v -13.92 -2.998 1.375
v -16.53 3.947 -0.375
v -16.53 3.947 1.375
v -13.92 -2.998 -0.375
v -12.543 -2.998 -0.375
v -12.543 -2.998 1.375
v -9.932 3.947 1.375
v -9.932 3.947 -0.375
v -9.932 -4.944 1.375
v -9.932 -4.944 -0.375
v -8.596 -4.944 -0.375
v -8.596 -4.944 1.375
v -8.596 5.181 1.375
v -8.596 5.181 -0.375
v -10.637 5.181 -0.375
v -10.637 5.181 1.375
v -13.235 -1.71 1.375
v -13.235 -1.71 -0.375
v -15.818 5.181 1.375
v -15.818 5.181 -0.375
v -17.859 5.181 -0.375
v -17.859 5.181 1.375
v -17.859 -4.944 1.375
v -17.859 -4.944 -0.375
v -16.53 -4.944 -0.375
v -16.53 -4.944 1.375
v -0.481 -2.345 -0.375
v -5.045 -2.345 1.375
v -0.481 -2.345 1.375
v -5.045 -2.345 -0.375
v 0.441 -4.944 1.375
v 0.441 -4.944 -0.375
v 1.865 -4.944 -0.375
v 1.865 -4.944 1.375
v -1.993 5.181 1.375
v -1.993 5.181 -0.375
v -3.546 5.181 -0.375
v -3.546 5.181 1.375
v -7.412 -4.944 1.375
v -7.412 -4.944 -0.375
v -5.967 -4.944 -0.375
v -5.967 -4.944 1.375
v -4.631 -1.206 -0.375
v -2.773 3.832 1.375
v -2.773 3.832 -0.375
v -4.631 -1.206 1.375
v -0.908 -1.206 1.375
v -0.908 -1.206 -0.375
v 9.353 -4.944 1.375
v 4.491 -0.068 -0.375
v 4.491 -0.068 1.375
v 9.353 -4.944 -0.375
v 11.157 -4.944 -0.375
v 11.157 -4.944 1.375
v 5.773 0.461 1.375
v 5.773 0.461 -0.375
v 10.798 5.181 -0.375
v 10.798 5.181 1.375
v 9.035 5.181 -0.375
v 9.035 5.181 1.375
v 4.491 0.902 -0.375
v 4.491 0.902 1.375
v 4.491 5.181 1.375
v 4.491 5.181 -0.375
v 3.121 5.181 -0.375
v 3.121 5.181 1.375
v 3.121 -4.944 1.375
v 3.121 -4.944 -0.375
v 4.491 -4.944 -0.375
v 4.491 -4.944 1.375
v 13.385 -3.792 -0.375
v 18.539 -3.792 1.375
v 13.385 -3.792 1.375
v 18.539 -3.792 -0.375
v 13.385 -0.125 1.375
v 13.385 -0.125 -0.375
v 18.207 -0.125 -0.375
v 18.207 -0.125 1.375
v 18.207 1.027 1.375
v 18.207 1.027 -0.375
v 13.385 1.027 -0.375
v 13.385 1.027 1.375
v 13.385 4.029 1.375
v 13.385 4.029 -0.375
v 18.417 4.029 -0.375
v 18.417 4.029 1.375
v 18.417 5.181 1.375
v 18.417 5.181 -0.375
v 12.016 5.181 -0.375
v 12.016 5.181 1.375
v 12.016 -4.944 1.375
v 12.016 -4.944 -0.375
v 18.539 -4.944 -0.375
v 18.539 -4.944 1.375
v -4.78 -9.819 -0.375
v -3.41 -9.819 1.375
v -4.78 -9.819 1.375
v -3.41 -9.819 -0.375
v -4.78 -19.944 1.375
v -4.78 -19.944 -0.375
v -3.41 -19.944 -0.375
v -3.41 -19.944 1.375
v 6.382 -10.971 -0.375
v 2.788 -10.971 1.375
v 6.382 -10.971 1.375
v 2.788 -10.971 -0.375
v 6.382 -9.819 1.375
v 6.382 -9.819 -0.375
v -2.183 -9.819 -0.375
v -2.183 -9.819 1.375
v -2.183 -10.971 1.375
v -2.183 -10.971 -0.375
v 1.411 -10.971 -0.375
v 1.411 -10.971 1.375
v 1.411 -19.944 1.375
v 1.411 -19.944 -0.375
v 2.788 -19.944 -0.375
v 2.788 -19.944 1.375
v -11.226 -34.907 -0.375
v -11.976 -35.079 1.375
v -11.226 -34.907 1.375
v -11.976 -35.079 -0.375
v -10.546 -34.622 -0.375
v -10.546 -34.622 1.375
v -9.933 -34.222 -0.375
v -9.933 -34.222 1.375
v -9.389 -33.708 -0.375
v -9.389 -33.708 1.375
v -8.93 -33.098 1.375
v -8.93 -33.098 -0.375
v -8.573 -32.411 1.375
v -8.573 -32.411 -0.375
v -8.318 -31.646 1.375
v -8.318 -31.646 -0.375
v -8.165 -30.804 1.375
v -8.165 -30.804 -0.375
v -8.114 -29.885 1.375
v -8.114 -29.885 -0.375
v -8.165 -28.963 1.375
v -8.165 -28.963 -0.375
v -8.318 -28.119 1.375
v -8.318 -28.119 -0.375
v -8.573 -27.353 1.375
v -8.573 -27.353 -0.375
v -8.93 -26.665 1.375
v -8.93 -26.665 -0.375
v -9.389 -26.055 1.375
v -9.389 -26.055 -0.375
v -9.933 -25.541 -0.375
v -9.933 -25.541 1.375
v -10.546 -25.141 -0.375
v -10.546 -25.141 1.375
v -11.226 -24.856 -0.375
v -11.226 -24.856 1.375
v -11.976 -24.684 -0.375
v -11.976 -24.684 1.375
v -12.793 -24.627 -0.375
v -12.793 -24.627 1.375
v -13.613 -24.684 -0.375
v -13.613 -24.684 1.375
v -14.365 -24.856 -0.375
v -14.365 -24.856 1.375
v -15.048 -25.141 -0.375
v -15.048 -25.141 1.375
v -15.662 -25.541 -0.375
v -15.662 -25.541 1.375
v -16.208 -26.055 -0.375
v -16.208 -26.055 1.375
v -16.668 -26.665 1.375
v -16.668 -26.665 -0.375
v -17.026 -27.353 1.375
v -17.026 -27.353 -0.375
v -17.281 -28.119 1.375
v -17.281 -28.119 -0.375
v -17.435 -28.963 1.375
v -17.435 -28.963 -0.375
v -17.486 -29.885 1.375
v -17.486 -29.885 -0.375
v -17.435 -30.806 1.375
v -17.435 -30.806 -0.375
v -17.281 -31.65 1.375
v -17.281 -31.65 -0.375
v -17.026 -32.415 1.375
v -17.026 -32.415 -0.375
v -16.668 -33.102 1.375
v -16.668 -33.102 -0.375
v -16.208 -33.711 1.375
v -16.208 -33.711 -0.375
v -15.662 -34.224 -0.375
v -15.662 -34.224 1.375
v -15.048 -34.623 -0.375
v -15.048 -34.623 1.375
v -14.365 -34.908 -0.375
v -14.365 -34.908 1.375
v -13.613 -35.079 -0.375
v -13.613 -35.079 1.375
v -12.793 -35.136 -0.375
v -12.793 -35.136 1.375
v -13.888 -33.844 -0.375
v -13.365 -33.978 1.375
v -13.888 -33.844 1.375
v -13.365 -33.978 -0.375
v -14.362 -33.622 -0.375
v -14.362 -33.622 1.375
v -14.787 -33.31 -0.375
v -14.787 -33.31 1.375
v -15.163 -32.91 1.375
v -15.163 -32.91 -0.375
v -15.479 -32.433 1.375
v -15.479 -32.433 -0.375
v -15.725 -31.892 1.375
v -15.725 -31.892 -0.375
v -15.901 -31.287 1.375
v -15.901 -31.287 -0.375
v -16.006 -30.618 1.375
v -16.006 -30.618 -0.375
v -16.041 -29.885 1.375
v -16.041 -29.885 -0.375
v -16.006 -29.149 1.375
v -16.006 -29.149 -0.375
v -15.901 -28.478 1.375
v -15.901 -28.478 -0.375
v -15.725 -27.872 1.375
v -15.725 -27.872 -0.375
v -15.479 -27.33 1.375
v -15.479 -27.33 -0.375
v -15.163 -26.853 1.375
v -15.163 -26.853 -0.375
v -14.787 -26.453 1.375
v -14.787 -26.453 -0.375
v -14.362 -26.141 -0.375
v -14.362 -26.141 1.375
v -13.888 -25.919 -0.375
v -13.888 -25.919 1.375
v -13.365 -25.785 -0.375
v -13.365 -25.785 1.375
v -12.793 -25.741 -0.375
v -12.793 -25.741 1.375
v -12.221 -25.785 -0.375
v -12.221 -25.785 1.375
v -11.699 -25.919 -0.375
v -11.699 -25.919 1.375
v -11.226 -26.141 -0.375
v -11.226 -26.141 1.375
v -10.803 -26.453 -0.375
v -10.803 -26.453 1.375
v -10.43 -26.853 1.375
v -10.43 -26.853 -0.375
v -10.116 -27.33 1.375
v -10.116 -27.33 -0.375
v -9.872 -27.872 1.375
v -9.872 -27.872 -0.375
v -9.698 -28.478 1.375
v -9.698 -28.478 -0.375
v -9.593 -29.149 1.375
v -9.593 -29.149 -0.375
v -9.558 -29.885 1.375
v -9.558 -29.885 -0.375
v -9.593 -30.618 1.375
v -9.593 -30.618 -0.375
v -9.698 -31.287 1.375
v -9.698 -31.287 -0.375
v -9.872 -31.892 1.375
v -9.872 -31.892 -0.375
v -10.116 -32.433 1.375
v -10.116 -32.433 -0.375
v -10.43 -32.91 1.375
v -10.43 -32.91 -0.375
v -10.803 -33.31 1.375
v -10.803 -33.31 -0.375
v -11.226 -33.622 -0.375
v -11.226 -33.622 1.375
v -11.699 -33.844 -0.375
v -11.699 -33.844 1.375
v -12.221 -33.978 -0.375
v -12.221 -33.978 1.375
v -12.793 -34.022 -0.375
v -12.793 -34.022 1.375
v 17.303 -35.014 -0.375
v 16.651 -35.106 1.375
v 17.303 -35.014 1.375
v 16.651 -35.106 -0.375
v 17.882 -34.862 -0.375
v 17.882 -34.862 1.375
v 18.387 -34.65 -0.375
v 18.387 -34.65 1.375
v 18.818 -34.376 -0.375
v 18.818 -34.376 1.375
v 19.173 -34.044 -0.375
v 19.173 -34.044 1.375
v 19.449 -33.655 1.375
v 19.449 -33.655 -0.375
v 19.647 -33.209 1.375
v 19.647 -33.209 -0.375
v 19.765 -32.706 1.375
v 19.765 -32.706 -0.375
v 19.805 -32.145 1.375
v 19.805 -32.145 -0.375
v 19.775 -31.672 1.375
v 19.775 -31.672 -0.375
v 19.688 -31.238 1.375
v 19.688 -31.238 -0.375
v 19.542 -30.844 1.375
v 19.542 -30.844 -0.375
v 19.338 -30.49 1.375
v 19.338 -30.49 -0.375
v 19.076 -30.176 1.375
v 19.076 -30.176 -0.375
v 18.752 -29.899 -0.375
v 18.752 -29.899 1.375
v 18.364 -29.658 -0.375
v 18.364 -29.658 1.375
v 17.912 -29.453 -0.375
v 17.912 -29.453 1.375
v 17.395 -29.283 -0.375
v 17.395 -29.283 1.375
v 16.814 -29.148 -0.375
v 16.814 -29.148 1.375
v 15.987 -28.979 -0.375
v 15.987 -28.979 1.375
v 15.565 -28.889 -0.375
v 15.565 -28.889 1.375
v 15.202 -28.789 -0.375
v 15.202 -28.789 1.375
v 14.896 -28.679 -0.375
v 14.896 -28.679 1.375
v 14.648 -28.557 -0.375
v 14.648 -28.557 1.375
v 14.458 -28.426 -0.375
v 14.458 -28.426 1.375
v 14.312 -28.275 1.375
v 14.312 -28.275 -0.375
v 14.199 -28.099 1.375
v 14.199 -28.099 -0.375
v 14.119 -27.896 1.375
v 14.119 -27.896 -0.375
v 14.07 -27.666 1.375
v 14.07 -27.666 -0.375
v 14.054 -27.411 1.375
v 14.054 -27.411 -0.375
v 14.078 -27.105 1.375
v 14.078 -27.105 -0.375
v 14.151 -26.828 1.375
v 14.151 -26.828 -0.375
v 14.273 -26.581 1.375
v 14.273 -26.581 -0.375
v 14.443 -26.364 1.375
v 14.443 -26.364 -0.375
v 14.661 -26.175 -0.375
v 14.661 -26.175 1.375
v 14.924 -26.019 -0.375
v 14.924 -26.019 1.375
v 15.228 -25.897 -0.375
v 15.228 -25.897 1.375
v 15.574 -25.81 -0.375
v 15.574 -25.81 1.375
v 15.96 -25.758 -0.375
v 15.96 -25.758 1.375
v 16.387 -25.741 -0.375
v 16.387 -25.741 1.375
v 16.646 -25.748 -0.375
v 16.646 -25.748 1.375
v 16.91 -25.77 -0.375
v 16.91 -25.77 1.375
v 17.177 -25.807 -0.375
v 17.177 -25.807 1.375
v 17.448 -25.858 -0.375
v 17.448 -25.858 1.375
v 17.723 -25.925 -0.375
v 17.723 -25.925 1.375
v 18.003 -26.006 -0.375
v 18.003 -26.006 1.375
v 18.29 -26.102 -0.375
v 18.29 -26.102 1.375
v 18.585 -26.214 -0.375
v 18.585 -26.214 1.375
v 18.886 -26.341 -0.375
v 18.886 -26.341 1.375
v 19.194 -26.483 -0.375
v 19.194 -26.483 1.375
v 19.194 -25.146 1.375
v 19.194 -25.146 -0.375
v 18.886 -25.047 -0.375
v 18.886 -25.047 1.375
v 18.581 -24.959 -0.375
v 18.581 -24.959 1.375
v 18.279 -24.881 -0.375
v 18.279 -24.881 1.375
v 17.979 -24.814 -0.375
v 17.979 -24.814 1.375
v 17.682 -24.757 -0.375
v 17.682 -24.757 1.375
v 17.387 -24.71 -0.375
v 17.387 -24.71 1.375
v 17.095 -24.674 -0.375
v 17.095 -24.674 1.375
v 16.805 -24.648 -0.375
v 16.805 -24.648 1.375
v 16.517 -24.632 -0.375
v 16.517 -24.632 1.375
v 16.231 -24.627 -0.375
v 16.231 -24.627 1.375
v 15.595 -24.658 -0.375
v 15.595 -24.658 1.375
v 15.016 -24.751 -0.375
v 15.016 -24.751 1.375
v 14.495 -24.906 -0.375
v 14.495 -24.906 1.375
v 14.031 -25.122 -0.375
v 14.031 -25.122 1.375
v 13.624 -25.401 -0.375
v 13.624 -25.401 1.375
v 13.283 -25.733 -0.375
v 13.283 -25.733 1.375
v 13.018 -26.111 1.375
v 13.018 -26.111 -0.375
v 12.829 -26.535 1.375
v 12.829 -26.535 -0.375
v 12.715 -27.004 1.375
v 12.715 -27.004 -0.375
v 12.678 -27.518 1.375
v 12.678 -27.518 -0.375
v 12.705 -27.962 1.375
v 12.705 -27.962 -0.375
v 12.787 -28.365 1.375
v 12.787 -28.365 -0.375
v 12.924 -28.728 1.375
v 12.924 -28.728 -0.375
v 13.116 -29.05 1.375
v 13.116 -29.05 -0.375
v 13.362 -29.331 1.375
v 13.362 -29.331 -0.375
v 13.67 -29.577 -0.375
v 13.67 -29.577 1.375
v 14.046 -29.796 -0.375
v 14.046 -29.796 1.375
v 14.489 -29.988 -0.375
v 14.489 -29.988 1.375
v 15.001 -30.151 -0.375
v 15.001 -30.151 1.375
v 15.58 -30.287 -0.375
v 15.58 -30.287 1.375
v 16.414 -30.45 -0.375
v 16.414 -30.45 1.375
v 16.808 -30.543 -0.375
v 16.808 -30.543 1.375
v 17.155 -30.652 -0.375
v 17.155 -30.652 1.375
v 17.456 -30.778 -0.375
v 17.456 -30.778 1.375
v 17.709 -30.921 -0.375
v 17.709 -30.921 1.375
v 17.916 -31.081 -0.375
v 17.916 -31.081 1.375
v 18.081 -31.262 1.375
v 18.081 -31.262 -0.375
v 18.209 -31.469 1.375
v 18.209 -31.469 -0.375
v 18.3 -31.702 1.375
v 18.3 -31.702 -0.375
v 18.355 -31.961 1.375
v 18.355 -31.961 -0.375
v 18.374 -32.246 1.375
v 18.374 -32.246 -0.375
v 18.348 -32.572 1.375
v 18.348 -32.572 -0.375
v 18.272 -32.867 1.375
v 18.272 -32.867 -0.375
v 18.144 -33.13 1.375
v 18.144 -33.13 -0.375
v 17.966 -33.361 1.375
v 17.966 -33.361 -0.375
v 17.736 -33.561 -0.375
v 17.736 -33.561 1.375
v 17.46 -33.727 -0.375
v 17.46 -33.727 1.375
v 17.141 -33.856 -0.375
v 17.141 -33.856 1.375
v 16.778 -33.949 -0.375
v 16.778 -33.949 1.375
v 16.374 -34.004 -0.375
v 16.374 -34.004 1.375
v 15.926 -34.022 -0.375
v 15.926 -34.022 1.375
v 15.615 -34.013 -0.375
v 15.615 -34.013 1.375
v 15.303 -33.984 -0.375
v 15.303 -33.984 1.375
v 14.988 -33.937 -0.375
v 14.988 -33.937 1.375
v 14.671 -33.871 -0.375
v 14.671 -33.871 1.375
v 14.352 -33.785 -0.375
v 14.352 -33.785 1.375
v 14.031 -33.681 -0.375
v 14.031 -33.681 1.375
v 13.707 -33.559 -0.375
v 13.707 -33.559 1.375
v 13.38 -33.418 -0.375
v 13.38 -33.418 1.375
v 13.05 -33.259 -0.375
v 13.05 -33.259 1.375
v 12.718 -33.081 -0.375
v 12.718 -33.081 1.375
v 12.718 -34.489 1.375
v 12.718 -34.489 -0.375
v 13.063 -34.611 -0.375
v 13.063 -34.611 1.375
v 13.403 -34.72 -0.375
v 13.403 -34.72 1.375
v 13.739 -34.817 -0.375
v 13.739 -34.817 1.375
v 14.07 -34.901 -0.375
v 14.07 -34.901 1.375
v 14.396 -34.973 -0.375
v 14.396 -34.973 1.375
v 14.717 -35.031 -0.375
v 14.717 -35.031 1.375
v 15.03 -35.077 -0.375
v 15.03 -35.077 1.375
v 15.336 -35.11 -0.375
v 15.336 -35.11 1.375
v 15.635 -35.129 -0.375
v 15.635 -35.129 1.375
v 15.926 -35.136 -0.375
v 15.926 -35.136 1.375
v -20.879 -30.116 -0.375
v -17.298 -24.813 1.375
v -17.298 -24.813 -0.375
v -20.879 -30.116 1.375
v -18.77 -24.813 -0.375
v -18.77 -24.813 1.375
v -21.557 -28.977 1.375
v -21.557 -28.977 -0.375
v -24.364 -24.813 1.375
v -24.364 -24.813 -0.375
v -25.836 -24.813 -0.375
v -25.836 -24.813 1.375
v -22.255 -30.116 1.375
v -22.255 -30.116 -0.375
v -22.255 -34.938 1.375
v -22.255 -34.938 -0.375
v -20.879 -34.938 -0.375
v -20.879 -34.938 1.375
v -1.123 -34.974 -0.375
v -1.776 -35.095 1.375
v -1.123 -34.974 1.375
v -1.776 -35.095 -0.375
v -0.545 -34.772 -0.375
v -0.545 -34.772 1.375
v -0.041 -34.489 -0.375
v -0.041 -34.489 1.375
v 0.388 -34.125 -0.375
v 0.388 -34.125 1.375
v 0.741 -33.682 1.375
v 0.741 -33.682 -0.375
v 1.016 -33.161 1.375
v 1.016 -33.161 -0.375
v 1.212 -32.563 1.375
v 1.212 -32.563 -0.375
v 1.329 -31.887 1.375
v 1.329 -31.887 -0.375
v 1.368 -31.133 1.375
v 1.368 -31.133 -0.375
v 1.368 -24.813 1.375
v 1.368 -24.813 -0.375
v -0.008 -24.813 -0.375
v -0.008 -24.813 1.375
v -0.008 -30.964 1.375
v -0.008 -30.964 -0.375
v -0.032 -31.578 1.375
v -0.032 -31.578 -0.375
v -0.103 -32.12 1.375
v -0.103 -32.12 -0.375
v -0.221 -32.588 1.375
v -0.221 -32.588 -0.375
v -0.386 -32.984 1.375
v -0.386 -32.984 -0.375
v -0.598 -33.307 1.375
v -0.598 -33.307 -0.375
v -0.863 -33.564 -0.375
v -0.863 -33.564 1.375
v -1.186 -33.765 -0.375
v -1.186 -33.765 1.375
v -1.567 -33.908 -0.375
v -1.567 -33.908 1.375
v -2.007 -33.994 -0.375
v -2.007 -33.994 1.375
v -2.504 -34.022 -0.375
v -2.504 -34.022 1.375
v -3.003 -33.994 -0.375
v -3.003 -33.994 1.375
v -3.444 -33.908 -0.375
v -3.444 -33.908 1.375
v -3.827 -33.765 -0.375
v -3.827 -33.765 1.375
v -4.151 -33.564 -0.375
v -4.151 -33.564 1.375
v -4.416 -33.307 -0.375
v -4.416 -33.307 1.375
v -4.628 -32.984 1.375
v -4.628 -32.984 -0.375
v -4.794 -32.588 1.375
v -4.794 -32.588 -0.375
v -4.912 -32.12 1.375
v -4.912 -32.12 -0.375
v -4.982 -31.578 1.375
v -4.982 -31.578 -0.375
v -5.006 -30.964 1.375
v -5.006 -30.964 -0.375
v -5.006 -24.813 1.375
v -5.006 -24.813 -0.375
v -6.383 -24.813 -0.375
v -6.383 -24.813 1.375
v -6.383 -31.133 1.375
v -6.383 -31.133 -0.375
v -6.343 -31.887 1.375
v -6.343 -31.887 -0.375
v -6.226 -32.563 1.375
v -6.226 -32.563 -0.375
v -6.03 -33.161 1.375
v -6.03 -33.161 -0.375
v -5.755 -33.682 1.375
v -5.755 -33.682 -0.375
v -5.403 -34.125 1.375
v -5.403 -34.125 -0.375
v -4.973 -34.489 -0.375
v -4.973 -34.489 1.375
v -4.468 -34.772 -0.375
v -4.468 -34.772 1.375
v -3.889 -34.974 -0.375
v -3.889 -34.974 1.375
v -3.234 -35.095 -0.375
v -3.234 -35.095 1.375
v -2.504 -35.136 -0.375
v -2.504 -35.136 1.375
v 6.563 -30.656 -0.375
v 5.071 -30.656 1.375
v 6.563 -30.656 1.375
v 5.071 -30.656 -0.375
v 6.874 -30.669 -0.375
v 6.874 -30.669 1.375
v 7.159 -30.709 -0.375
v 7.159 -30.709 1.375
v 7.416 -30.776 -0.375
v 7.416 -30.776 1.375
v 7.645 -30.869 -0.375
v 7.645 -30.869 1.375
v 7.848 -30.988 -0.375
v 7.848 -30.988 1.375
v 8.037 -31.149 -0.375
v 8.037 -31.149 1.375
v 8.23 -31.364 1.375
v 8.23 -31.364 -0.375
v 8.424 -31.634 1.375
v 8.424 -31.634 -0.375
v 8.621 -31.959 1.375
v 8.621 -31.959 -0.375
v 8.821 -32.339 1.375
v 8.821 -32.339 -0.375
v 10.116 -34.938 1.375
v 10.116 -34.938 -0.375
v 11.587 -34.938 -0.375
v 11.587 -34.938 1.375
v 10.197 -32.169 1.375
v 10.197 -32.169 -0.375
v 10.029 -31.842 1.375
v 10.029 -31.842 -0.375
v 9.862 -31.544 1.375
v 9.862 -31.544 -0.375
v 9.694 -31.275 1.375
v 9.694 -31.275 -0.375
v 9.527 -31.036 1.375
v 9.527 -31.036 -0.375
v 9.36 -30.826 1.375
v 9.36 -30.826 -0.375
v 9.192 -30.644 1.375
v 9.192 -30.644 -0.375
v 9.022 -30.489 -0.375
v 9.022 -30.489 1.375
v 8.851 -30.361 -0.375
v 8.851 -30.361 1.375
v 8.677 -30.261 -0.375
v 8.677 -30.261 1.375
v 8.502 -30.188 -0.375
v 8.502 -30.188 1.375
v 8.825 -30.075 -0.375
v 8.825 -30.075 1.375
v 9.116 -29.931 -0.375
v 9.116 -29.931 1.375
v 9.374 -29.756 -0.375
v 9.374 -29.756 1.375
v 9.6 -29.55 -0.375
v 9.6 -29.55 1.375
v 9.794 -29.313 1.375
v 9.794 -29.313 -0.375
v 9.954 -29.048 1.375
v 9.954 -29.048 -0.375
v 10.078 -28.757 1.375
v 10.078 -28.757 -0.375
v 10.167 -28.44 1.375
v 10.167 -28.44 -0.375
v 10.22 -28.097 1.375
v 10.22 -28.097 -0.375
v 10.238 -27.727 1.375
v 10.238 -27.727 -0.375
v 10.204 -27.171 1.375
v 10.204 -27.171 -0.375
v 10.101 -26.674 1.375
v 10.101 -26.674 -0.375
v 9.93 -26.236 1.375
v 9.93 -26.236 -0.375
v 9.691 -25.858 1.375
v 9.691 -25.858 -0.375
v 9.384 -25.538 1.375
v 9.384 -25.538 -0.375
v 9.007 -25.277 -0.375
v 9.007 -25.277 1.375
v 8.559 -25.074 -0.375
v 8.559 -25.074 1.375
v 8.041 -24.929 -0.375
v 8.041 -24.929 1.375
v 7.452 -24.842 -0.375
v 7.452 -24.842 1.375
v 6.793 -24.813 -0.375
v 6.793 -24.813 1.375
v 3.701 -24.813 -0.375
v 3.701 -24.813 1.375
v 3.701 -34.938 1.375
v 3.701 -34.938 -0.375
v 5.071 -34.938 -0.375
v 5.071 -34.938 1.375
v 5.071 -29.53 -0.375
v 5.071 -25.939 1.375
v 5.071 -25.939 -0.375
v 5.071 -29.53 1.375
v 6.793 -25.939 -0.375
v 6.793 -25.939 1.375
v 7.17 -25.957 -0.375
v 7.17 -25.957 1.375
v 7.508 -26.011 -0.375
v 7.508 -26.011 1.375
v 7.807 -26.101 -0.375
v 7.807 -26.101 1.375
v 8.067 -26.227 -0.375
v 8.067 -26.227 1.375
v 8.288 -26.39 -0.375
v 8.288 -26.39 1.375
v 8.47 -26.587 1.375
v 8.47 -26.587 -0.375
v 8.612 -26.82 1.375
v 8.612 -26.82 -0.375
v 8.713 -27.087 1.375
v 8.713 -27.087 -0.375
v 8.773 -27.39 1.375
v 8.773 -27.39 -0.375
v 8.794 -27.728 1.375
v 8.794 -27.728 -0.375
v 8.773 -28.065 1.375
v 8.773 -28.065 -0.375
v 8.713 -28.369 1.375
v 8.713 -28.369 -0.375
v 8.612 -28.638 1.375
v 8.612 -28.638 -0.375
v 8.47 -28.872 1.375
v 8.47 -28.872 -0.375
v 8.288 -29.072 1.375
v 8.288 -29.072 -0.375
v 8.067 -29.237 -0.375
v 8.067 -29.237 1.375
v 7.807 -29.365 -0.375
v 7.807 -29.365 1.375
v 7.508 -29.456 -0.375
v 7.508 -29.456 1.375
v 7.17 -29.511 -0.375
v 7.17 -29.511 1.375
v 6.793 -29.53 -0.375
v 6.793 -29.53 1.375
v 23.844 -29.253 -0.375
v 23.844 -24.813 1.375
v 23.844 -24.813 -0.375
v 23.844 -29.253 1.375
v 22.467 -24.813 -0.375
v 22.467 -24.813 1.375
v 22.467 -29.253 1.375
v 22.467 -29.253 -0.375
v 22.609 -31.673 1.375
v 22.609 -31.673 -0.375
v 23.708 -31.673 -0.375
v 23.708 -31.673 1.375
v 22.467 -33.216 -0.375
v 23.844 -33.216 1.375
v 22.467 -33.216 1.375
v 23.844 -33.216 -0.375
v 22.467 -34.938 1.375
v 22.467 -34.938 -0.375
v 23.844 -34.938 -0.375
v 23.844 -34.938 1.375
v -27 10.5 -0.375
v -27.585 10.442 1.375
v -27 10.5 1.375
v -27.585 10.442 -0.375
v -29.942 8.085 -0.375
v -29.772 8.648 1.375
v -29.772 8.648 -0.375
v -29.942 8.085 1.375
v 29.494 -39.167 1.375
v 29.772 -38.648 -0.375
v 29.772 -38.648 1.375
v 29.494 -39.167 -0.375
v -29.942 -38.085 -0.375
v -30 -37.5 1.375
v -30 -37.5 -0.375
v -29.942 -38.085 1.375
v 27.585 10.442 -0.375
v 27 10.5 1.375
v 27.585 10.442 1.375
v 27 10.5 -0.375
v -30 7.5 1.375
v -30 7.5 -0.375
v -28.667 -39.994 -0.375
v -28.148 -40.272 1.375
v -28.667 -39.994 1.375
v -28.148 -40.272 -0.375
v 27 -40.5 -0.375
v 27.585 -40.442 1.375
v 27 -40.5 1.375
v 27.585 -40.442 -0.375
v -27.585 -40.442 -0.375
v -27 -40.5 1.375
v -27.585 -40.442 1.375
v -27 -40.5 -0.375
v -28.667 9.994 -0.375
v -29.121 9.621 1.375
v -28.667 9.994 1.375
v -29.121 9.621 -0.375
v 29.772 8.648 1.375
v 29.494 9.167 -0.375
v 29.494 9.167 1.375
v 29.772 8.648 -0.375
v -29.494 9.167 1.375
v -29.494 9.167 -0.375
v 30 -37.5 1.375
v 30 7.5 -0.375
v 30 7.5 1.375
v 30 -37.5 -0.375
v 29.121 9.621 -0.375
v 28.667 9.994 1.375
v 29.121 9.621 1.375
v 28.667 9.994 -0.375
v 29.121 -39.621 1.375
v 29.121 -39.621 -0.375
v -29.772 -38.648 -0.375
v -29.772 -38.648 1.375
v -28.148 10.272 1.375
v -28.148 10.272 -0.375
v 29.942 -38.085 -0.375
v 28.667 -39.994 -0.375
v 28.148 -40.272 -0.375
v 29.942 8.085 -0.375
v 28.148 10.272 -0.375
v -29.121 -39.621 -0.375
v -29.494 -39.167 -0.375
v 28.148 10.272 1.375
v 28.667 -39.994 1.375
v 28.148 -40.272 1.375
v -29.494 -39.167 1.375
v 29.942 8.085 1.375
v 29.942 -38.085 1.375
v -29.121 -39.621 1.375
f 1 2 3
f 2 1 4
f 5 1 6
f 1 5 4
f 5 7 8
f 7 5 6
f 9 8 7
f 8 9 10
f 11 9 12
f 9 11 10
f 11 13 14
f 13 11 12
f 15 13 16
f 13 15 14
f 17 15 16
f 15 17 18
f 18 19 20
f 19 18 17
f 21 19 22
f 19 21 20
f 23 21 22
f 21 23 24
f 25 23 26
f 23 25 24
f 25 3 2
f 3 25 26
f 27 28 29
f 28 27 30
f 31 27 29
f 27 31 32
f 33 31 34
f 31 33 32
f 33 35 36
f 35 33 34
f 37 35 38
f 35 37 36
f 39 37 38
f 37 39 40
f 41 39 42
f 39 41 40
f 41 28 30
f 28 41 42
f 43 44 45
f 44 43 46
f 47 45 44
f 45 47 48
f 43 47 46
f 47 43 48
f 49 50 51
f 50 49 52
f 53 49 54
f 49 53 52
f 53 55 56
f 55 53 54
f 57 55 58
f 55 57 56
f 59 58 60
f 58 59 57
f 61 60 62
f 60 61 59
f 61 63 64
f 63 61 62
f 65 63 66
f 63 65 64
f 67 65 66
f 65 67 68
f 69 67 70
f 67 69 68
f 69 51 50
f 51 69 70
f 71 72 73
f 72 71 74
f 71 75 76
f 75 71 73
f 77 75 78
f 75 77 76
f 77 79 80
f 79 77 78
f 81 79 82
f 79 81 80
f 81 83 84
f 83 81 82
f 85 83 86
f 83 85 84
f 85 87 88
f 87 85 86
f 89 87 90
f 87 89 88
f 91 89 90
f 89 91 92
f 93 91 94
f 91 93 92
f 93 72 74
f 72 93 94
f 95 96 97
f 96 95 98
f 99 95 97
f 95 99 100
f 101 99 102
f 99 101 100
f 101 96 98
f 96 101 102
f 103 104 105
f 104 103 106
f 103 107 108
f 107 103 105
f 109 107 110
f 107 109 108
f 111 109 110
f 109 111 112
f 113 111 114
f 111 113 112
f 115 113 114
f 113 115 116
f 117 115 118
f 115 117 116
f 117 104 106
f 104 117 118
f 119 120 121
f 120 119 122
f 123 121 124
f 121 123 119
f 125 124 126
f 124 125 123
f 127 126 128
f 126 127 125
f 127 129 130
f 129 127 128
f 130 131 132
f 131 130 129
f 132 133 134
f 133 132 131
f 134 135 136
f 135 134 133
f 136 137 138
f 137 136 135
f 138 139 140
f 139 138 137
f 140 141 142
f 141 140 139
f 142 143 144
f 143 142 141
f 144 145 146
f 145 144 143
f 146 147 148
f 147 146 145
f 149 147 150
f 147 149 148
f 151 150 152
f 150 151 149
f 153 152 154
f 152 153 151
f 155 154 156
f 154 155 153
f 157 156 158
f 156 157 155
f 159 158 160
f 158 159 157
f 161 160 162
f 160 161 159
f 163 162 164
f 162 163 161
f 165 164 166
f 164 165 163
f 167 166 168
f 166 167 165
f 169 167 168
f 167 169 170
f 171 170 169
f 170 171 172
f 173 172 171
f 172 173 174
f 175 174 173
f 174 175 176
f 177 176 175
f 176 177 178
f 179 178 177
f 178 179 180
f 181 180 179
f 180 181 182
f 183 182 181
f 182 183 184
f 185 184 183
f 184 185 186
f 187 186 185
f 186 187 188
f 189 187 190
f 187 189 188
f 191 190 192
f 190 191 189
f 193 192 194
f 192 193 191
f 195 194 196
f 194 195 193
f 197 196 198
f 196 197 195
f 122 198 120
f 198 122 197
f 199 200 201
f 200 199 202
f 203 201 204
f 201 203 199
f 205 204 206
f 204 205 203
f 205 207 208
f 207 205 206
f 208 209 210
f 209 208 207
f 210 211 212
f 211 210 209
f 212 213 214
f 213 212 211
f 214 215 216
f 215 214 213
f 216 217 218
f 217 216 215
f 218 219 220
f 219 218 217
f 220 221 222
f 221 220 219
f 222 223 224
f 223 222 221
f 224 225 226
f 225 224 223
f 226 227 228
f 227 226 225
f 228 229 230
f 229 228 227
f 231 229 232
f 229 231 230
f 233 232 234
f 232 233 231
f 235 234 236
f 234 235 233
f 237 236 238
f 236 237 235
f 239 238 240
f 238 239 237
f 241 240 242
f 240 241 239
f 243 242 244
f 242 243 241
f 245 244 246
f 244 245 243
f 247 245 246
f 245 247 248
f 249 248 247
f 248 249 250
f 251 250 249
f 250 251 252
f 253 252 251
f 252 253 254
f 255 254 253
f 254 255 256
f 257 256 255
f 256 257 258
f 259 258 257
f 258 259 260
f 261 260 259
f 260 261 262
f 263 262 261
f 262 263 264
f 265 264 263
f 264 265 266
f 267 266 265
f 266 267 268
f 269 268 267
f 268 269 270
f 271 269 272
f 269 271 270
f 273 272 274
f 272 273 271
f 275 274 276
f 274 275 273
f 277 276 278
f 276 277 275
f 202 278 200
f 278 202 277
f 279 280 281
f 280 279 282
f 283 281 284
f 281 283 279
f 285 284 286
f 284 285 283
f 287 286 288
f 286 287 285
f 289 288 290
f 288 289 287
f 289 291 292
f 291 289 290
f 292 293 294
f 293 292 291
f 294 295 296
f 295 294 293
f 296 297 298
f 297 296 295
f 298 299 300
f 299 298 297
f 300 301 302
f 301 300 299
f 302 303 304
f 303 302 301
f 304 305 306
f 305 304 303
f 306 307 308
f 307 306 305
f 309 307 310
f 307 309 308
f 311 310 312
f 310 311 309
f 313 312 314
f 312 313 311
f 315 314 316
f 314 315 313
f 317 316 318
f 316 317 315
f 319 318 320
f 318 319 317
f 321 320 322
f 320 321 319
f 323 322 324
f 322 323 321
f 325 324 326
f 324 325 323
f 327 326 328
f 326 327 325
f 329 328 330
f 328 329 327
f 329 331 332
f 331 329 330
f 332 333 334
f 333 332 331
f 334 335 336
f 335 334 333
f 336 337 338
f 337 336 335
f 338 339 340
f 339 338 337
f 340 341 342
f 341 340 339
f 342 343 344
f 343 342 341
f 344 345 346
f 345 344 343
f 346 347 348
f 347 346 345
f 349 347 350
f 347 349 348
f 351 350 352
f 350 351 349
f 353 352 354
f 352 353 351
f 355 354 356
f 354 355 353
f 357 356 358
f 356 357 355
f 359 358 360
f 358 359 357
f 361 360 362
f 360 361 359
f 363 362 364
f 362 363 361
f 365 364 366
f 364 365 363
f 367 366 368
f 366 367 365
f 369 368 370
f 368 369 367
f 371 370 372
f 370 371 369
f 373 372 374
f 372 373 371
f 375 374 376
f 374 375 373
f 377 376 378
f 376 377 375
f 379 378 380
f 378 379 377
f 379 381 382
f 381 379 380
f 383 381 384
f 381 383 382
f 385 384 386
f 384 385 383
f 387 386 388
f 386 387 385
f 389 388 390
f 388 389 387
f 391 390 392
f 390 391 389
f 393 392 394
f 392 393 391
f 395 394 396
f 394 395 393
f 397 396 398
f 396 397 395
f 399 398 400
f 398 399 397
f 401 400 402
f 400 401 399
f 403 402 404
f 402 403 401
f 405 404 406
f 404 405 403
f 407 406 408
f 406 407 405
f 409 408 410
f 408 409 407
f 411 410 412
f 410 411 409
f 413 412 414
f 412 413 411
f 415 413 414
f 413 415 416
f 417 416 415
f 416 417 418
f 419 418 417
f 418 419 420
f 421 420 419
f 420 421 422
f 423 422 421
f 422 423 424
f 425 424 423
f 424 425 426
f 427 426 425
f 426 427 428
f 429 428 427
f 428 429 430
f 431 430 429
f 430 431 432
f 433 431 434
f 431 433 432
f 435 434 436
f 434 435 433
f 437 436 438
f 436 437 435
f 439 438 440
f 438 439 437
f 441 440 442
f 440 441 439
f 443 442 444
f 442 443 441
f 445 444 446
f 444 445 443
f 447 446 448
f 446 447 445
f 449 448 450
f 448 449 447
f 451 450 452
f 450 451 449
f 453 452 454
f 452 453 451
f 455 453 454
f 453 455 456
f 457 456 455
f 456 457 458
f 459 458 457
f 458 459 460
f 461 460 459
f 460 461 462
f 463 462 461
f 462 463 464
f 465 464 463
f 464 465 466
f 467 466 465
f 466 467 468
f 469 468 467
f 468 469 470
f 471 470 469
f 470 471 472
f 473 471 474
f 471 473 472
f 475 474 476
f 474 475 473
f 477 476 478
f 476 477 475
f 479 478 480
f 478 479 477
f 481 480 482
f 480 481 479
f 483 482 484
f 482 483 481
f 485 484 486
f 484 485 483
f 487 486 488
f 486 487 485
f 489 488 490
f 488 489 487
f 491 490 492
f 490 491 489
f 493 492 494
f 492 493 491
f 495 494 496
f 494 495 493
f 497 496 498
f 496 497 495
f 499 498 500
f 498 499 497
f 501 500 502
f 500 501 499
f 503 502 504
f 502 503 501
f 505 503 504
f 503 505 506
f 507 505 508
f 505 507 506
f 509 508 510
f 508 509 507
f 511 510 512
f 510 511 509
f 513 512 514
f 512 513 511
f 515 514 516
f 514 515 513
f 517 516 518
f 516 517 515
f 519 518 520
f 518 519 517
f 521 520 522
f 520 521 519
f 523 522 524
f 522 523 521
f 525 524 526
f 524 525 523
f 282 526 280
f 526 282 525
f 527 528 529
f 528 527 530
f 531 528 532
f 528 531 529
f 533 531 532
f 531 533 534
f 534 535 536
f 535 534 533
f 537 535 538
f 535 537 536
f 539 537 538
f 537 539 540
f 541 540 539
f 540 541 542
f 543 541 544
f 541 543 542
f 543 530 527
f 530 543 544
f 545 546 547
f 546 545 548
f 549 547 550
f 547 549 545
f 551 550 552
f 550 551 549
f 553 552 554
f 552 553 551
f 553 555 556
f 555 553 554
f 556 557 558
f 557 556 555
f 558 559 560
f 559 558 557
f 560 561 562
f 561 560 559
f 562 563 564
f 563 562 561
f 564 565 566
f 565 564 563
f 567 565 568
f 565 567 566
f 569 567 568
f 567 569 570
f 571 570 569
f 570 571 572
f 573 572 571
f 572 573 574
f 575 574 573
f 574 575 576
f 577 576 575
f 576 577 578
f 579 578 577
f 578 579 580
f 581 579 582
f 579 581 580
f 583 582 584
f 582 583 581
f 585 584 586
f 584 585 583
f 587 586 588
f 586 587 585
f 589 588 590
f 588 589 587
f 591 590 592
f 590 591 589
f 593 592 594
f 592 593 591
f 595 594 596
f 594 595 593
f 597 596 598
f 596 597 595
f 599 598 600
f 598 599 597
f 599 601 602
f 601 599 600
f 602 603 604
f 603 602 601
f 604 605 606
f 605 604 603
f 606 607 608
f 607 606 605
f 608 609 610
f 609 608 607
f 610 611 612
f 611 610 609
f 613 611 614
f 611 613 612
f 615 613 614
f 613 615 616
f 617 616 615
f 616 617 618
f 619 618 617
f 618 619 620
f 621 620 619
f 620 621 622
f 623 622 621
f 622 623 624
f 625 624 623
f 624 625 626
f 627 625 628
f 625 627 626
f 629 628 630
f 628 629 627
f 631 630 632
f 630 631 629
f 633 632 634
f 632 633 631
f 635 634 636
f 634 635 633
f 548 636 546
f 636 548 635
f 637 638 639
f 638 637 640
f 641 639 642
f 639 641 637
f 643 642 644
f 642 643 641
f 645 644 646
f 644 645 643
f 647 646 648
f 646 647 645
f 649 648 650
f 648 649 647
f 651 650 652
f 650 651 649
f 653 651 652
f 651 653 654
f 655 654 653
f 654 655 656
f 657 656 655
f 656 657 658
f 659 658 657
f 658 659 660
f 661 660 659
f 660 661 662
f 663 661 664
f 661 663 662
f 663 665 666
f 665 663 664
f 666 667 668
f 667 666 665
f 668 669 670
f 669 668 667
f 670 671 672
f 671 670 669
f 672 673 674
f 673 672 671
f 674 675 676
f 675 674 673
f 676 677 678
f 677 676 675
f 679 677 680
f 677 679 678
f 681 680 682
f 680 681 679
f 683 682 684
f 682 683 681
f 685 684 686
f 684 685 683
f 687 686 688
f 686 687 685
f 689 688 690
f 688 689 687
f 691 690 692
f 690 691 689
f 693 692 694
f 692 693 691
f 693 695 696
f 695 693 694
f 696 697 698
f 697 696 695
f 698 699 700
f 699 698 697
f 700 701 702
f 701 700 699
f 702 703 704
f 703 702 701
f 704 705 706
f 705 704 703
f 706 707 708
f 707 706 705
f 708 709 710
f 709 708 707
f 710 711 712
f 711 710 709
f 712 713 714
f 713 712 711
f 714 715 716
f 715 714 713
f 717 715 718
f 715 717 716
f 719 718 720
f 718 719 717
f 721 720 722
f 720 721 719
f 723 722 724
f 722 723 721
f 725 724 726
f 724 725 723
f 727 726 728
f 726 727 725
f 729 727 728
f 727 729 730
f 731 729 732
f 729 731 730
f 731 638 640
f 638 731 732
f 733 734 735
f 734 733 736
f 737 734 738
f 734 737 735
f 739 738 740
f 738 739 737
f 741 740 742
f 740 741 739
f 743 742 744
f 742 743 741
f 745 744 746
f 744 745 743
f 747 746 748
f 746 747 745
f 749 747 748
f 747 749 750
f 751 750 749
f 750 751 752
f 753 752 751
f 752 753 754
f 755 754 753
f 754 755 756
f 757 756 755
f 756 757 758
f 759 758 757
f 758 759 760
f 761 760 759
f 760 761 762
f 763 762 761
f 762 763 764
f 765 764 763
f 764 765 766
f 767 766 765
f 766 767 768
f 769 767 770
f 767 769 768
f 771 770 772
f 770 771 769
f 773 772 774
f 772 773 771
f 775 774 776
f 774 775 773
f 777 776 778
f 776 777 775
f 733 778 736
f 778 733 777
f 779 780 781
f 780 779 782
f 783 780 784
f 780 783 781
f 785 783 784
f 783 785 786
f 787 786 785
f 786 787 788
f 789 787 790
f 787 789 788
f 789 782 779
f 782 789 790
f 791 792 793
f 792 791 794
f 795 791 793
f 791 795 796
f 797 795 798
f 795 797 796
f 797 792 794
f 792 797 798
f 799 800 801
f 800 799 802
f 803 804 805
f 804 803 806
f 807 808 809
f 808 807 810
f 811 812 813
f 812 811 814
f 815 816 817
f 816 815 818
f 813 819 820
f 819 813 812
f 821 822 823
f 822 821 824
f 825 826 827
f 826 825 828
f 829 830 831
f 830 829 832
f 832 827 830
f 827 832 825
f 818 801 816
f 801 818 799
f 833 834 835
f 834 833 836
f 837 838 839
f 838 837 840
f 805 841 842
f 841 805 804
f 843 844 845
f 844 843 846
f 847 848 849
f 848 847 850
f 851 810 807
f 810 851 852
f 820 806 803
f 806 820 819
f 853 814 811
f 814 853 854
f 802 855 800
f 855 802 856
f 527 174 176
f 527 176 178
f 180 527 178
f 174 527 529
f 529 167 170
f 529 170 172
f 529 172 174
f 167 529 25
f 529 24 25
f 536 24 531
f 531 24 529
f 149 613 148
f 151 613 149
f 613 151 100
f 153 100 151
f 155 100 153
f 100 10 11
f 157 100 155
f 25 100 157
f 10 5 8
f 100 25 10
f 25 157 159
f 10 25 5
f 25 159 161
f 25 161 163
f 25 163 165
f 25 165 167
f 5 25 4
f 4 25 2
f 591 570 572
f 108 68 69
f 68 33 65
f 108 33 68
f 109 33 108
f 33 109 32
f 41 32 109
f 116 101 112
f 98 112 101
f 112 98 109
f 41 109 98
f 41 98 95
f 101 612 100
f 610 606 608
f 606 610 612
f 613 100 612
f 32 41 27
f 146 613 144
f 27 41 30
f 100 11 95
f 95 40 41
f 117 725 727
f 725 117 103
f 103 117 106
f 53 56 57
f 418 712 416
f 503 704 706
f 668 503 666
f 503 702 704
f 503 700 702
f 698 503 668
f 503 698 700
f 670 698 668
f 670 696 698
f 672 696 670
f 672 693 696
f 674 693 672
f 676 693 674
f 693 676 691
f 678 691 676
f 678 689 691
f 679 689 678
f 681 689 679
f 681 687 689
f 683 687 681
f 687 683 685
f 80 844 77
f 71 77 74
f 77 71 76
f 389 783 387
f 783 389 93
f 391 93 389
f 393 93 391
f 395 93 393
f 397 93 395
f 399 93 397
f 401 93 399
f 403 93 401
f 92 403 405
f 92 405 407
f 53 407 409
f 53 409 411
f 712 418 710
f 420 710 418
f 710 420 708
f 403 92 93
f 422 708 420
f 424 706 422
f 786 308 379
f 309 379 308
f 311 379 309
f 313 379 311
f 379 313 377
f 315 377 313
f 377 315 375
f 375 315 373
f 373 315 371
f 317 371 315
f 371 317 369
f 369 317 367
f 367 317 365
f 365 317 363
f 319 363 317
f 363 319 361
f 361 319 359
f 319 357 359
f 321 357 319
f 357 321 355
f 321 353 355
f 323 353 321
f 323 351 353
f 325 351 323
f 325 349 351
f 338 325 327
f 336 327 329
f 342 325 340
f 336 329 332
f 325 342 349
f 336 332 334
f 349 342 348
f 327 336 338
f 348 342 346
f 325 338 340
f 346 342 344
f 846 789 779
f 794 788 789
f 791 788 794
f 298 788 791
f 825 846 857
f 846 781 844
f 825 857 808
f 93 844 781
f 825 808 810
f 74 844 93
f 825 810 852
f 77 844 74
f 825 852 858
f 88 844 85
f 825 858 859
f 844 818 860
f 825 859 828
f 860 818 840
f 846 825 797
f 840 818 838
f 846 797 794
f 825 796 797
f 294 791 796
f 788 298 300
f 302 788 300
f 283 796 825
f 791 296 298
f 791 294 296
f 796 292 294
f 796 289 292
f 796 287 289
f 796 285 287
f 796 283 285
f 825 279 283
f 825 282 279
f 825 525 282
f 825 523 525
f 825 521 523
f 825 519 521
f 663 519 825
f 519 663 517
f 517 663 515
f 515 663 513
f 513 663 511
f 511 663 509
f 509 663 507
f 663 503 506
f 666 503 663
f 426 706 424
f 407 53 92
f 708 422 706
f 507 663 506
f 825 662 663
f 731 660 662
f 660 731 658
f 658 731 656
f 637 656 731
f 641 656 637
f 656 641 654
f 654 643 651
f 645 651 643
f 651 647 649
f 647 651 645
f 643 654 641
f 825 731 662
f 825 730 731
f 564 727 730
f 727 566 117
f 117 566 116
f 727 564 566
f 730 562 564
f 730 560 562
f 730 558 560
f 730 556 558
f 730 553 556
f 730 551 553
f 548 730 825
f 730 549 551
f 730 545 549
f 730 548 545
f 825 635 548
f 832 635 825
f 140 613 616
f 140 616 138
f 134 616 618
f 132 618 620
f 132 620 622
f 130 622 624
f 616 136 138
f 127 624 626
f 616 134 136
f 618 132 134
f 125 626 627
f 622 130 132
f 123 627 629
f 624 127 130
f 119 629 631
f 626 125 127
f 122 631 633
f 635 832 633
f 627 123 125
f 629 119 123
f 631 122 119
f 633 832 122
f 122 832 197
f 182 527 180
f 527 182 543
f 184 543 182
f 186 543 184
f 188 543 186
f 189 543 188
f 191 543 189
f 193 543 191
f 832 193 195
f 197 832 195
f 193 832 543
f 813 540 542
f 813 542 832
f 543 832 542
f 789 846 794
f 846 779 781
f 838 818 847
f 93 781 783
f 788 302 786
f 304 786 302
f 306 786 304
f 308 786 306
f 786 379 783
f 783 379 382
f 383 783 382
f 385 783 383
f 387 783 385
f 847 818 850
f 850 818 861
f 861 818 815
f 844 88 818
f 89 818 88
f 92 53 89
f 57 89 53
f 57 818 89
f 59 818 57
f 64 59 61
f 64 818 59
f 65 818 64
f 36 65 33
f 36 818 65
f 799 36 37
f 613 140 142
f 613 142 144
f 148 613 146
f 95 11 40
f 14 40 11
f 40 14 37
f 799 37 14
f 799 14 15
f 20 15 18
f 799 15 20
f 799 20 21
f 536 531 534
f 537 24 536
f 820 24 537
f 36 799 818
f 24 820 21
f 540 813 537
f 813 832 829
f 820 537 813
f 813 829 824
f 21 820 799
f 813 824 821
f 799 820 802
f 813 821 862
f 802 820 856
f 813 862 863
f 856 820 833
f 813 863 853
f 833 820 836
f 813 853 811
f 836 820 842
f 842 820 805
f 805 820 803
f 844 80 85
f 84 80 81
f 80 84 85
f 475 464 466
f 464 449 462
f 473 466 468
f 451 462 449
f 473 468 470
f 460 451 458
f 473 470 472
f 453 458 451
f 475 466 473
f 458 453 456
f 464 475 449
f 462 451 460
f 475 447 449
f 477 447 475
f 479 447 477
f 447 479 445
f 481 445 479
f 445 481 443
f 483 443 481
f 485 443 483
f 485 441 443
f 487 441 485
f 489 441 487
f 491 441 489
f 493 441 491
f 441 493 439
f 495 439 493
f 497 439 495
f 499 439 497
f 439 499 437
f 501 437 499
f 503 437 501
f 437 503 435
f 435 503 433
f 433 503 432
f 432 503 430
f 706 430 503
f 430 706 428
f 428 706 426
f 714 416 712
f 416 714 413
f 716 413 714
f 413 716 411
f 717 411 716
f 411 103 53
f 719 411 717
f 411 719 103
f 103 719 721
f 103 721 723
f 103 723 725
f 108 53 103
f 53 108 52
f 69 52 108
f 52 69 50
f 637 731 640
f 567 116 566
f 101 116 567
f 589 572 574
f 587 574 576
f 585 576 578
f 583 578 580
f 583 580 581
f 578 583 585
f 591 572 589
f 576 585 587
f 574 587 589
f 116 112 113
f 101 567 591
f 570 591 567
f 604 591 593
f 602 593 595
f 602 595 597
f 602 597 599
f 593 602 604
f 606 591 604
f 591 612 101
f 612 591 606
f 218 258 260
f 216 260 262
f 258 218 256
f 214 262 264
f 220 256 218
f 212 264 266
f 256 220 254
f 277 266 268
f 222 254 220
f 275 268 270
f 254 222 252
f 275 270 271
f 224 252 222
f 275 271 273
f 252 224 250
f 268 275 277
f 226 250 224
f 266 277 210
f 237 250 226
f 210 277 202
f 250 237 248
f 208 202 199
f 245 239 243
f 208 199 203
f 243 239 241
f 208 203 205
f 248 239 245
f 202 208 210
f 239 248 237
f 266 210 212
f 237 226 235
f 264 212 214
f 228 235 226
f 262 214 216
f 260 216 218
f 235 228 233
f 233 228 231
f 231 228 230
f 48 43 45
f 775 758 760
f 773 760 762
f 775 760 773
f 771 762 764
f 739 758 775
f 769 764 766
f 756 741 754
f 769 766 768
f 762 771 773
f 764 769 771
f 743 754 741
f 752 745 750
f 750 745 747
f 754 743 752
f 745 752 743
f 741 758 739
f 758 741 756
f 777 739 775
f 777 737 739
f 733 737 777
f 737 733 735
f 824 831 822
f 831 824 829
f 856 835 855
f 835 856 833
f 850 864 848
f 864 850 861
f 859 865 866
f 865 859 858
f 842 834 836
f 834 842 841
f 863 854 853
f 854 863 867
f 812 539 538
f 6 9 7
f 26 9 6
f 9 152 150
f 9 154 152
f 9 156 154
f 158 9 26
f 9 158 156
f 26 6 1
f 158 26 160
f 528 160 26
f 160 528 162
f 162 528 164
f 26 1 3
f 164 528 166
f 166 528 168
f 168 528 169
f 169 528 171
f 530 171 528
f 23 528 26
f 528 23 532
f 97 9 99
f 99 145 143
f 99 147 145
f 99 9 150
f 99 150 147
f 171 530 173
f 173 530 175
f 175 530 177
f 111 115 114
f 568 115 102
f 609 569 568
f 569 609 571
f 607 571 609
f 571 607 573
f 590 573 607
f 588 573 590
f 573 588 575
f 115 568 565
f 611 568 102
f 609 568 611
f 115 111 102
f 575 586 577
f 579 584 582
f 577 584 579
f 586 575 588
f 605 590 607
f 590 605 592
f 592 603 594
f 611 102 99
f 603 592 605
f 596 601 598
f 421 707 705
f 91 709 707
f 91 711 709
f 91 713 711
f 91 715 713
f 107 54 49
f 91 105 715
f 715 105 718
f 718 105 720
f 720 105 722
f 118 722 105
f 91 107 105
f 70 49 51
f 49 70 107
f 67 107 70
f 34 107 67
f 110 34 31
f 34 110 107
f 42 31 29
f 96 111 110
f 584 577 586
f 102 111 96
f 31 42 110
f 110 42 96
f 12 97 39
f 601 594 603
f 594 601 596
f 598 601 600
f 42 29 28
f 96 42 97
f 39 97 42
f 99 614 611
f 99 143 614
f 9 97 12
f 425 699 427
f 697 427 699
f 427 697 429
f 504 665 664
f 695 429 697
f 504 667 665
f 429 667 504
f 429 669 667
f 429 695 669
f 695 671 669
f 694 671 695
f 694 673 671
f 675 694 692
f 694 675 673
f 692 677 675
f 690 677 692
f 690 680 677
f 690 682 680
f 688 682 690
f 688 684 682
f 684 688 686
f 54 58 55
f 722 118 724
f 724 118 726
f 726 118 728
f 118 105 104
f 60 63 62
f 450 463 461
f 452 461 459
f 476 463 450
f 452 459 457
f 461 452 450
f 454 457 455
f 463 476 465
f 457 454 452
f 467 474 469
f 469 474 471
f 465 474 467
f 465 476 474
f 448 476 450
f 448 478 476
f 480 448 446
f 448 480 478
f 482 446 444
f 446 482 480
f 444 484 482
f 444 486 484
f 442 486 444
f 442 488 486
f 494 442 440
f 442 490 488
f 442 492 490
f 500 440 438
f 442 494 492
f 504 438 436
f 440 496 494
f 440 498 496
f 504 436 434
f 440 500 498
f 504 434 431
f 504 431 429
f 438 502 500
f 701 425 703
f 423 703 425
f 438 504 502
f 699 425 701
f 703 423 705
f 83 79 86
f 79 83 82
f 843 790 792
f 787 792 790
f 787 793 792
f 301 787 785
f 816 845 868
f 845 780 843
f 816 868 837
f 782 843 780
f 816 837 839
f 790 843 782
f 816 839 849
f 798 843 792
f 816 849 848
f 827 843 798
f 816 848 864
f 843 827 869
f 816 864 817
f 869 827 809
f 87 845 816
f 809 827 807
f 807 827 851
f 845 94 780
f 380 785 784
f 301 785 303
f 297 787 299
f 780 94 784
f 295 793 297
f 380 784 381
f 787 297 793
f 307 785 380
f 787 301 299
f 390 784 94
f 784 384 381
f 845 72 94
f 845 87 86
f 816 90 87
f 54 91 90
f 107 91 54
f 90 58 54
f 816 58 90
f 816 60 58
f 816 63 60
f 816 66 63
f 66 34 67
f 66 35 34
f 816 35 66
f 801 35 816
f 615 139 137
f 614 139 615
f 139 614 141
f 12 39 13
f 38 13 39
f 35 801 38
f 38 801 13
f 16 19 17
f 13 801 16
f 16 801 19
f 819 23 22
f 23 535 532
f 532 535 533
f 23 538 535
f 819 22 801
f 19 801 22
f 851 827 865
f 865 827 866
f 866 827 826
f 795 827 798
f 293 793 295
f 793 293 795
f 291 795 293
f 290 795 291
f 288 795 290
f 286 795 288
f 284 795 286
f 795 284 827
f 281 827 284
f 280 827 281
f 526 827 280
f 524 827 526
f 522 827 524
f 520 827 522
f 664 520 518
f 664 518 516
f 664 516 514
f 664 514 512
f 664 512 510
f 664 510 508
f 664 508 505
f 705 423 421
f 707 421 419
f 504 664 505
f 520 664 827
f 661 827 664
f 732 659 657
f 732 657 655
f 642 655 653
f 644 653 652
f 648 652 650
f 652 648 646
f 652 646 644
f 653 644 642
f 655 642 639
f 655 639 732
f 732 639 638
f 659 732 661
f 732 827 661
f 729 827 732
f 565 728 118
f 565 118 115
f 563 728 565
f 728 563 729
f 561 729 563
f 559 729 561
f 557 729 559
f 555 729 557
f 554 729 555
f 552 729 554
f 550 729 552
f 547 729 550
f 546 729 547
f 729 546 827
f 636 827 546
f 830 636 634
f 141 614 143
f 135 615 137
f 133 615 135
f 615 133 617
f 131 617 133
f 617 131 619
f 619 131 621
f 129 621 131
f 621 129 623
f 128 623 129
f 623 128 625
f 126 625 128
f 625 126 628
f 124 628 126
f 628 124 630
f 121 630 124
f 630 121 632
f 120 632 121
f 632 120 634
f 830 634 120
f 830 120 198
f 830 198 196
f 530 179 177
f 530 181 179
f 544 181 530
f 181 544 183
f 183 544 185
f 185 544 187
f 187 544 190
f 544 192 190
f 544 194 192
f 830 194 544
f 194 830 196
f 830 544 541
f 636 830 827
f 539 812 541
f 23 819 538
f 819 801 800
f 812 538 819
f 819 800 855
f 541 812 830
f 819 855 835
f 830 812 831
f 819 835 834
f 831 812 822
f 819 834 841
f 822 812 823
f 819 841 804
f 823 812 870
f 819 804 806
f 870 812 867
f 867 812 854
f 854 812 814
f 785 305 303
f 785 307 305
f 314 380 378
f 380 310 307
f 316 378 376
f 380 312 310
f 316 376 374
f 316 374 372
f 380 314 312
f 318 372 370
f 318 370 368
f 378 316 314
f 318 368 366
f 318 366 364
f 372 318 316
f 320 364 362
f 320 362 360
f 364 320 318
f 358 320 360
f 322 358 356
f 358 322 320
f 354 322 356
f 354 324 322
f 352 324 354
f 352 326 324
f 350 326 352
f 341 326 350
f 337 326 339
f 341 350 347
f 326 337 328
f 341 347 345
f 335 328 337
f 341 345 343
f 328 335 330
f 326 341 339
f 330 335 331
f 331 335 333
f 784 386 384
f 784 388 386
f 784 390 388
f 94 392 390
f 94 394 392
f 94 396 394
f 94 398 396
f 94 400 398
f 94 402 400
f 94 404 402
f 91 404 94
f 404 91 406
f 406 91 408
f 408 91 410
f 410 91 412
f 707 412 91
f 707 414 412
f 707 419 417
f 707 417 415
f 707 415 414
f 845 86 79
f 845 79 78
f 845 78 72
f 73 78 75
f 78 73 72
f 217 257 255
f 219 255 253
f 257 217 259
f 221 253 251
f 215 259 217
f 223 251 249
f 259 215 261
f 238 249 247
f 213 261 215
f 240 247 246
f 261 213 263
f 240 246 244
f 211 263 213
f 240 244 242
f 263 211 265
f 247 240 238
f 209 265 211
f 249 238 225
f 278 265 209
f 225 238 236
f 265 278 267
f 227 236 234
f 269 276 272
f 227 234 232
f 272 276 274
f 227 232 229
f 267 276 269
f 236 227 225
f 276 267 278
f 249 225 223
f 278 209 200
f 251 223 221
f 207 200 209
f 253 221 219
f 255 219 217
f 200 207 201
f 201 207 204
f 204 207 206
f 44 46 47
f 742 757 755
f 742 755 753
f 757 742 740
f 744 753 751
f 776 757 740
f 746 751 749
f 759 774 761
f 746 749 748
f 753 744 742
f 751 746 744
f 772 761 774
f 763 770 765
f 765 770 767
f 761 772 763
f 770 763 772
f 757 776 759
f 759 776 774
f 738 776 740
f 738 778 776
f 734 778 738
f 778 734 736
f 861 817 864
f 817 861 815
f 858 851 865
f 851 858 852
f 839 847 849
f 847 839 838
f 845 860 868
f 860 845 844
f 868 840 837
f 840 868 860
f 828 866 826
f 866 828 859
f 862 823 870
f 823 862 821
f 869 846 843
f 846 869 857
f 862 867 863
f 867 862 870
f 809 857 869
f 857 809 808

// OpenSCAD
line1="MAKE";
line2="IT";
line3="YOURS!";
border=12;

difference() {
    $fn=32;
    minkowski() {
        union(){
            cube([max(len(line1),len(line2),len(line3))*7+border,15,0.75], center=true);
            if(line2||line3) {
                translate([0,-15,0]) cube([max(len(line1),len(line2),len(line3))*7+border,15,0.75], center=true);
            }
            if(line3) {
                translate([0,-30,0]) cube([max(len(line1),len(line2),len(line3))*7+border,15,0.75], center=true);
            }
        }
        cylinder(r=3,h=1);
    }
    
    union() {
            linear_extrude(height = 3, center=true) text(line1, font = "Allerta Stencil", "center", size = 10, valign="center", halign="center");
        if(line2) {
            translate([0,-15,0]) linear_extrude(height = 3, center=true) text(line2, font = "Allerta Stencil", "center", size = 10, valign="center", halign="center");
        }
        if(line3) {
            translate([0,-30,0]) linear_extrude(height = 3, center=true) text(line3, font = "Allerta Stencil", "center", size = 10, valign="center", halign="center");
        }
    }
}
